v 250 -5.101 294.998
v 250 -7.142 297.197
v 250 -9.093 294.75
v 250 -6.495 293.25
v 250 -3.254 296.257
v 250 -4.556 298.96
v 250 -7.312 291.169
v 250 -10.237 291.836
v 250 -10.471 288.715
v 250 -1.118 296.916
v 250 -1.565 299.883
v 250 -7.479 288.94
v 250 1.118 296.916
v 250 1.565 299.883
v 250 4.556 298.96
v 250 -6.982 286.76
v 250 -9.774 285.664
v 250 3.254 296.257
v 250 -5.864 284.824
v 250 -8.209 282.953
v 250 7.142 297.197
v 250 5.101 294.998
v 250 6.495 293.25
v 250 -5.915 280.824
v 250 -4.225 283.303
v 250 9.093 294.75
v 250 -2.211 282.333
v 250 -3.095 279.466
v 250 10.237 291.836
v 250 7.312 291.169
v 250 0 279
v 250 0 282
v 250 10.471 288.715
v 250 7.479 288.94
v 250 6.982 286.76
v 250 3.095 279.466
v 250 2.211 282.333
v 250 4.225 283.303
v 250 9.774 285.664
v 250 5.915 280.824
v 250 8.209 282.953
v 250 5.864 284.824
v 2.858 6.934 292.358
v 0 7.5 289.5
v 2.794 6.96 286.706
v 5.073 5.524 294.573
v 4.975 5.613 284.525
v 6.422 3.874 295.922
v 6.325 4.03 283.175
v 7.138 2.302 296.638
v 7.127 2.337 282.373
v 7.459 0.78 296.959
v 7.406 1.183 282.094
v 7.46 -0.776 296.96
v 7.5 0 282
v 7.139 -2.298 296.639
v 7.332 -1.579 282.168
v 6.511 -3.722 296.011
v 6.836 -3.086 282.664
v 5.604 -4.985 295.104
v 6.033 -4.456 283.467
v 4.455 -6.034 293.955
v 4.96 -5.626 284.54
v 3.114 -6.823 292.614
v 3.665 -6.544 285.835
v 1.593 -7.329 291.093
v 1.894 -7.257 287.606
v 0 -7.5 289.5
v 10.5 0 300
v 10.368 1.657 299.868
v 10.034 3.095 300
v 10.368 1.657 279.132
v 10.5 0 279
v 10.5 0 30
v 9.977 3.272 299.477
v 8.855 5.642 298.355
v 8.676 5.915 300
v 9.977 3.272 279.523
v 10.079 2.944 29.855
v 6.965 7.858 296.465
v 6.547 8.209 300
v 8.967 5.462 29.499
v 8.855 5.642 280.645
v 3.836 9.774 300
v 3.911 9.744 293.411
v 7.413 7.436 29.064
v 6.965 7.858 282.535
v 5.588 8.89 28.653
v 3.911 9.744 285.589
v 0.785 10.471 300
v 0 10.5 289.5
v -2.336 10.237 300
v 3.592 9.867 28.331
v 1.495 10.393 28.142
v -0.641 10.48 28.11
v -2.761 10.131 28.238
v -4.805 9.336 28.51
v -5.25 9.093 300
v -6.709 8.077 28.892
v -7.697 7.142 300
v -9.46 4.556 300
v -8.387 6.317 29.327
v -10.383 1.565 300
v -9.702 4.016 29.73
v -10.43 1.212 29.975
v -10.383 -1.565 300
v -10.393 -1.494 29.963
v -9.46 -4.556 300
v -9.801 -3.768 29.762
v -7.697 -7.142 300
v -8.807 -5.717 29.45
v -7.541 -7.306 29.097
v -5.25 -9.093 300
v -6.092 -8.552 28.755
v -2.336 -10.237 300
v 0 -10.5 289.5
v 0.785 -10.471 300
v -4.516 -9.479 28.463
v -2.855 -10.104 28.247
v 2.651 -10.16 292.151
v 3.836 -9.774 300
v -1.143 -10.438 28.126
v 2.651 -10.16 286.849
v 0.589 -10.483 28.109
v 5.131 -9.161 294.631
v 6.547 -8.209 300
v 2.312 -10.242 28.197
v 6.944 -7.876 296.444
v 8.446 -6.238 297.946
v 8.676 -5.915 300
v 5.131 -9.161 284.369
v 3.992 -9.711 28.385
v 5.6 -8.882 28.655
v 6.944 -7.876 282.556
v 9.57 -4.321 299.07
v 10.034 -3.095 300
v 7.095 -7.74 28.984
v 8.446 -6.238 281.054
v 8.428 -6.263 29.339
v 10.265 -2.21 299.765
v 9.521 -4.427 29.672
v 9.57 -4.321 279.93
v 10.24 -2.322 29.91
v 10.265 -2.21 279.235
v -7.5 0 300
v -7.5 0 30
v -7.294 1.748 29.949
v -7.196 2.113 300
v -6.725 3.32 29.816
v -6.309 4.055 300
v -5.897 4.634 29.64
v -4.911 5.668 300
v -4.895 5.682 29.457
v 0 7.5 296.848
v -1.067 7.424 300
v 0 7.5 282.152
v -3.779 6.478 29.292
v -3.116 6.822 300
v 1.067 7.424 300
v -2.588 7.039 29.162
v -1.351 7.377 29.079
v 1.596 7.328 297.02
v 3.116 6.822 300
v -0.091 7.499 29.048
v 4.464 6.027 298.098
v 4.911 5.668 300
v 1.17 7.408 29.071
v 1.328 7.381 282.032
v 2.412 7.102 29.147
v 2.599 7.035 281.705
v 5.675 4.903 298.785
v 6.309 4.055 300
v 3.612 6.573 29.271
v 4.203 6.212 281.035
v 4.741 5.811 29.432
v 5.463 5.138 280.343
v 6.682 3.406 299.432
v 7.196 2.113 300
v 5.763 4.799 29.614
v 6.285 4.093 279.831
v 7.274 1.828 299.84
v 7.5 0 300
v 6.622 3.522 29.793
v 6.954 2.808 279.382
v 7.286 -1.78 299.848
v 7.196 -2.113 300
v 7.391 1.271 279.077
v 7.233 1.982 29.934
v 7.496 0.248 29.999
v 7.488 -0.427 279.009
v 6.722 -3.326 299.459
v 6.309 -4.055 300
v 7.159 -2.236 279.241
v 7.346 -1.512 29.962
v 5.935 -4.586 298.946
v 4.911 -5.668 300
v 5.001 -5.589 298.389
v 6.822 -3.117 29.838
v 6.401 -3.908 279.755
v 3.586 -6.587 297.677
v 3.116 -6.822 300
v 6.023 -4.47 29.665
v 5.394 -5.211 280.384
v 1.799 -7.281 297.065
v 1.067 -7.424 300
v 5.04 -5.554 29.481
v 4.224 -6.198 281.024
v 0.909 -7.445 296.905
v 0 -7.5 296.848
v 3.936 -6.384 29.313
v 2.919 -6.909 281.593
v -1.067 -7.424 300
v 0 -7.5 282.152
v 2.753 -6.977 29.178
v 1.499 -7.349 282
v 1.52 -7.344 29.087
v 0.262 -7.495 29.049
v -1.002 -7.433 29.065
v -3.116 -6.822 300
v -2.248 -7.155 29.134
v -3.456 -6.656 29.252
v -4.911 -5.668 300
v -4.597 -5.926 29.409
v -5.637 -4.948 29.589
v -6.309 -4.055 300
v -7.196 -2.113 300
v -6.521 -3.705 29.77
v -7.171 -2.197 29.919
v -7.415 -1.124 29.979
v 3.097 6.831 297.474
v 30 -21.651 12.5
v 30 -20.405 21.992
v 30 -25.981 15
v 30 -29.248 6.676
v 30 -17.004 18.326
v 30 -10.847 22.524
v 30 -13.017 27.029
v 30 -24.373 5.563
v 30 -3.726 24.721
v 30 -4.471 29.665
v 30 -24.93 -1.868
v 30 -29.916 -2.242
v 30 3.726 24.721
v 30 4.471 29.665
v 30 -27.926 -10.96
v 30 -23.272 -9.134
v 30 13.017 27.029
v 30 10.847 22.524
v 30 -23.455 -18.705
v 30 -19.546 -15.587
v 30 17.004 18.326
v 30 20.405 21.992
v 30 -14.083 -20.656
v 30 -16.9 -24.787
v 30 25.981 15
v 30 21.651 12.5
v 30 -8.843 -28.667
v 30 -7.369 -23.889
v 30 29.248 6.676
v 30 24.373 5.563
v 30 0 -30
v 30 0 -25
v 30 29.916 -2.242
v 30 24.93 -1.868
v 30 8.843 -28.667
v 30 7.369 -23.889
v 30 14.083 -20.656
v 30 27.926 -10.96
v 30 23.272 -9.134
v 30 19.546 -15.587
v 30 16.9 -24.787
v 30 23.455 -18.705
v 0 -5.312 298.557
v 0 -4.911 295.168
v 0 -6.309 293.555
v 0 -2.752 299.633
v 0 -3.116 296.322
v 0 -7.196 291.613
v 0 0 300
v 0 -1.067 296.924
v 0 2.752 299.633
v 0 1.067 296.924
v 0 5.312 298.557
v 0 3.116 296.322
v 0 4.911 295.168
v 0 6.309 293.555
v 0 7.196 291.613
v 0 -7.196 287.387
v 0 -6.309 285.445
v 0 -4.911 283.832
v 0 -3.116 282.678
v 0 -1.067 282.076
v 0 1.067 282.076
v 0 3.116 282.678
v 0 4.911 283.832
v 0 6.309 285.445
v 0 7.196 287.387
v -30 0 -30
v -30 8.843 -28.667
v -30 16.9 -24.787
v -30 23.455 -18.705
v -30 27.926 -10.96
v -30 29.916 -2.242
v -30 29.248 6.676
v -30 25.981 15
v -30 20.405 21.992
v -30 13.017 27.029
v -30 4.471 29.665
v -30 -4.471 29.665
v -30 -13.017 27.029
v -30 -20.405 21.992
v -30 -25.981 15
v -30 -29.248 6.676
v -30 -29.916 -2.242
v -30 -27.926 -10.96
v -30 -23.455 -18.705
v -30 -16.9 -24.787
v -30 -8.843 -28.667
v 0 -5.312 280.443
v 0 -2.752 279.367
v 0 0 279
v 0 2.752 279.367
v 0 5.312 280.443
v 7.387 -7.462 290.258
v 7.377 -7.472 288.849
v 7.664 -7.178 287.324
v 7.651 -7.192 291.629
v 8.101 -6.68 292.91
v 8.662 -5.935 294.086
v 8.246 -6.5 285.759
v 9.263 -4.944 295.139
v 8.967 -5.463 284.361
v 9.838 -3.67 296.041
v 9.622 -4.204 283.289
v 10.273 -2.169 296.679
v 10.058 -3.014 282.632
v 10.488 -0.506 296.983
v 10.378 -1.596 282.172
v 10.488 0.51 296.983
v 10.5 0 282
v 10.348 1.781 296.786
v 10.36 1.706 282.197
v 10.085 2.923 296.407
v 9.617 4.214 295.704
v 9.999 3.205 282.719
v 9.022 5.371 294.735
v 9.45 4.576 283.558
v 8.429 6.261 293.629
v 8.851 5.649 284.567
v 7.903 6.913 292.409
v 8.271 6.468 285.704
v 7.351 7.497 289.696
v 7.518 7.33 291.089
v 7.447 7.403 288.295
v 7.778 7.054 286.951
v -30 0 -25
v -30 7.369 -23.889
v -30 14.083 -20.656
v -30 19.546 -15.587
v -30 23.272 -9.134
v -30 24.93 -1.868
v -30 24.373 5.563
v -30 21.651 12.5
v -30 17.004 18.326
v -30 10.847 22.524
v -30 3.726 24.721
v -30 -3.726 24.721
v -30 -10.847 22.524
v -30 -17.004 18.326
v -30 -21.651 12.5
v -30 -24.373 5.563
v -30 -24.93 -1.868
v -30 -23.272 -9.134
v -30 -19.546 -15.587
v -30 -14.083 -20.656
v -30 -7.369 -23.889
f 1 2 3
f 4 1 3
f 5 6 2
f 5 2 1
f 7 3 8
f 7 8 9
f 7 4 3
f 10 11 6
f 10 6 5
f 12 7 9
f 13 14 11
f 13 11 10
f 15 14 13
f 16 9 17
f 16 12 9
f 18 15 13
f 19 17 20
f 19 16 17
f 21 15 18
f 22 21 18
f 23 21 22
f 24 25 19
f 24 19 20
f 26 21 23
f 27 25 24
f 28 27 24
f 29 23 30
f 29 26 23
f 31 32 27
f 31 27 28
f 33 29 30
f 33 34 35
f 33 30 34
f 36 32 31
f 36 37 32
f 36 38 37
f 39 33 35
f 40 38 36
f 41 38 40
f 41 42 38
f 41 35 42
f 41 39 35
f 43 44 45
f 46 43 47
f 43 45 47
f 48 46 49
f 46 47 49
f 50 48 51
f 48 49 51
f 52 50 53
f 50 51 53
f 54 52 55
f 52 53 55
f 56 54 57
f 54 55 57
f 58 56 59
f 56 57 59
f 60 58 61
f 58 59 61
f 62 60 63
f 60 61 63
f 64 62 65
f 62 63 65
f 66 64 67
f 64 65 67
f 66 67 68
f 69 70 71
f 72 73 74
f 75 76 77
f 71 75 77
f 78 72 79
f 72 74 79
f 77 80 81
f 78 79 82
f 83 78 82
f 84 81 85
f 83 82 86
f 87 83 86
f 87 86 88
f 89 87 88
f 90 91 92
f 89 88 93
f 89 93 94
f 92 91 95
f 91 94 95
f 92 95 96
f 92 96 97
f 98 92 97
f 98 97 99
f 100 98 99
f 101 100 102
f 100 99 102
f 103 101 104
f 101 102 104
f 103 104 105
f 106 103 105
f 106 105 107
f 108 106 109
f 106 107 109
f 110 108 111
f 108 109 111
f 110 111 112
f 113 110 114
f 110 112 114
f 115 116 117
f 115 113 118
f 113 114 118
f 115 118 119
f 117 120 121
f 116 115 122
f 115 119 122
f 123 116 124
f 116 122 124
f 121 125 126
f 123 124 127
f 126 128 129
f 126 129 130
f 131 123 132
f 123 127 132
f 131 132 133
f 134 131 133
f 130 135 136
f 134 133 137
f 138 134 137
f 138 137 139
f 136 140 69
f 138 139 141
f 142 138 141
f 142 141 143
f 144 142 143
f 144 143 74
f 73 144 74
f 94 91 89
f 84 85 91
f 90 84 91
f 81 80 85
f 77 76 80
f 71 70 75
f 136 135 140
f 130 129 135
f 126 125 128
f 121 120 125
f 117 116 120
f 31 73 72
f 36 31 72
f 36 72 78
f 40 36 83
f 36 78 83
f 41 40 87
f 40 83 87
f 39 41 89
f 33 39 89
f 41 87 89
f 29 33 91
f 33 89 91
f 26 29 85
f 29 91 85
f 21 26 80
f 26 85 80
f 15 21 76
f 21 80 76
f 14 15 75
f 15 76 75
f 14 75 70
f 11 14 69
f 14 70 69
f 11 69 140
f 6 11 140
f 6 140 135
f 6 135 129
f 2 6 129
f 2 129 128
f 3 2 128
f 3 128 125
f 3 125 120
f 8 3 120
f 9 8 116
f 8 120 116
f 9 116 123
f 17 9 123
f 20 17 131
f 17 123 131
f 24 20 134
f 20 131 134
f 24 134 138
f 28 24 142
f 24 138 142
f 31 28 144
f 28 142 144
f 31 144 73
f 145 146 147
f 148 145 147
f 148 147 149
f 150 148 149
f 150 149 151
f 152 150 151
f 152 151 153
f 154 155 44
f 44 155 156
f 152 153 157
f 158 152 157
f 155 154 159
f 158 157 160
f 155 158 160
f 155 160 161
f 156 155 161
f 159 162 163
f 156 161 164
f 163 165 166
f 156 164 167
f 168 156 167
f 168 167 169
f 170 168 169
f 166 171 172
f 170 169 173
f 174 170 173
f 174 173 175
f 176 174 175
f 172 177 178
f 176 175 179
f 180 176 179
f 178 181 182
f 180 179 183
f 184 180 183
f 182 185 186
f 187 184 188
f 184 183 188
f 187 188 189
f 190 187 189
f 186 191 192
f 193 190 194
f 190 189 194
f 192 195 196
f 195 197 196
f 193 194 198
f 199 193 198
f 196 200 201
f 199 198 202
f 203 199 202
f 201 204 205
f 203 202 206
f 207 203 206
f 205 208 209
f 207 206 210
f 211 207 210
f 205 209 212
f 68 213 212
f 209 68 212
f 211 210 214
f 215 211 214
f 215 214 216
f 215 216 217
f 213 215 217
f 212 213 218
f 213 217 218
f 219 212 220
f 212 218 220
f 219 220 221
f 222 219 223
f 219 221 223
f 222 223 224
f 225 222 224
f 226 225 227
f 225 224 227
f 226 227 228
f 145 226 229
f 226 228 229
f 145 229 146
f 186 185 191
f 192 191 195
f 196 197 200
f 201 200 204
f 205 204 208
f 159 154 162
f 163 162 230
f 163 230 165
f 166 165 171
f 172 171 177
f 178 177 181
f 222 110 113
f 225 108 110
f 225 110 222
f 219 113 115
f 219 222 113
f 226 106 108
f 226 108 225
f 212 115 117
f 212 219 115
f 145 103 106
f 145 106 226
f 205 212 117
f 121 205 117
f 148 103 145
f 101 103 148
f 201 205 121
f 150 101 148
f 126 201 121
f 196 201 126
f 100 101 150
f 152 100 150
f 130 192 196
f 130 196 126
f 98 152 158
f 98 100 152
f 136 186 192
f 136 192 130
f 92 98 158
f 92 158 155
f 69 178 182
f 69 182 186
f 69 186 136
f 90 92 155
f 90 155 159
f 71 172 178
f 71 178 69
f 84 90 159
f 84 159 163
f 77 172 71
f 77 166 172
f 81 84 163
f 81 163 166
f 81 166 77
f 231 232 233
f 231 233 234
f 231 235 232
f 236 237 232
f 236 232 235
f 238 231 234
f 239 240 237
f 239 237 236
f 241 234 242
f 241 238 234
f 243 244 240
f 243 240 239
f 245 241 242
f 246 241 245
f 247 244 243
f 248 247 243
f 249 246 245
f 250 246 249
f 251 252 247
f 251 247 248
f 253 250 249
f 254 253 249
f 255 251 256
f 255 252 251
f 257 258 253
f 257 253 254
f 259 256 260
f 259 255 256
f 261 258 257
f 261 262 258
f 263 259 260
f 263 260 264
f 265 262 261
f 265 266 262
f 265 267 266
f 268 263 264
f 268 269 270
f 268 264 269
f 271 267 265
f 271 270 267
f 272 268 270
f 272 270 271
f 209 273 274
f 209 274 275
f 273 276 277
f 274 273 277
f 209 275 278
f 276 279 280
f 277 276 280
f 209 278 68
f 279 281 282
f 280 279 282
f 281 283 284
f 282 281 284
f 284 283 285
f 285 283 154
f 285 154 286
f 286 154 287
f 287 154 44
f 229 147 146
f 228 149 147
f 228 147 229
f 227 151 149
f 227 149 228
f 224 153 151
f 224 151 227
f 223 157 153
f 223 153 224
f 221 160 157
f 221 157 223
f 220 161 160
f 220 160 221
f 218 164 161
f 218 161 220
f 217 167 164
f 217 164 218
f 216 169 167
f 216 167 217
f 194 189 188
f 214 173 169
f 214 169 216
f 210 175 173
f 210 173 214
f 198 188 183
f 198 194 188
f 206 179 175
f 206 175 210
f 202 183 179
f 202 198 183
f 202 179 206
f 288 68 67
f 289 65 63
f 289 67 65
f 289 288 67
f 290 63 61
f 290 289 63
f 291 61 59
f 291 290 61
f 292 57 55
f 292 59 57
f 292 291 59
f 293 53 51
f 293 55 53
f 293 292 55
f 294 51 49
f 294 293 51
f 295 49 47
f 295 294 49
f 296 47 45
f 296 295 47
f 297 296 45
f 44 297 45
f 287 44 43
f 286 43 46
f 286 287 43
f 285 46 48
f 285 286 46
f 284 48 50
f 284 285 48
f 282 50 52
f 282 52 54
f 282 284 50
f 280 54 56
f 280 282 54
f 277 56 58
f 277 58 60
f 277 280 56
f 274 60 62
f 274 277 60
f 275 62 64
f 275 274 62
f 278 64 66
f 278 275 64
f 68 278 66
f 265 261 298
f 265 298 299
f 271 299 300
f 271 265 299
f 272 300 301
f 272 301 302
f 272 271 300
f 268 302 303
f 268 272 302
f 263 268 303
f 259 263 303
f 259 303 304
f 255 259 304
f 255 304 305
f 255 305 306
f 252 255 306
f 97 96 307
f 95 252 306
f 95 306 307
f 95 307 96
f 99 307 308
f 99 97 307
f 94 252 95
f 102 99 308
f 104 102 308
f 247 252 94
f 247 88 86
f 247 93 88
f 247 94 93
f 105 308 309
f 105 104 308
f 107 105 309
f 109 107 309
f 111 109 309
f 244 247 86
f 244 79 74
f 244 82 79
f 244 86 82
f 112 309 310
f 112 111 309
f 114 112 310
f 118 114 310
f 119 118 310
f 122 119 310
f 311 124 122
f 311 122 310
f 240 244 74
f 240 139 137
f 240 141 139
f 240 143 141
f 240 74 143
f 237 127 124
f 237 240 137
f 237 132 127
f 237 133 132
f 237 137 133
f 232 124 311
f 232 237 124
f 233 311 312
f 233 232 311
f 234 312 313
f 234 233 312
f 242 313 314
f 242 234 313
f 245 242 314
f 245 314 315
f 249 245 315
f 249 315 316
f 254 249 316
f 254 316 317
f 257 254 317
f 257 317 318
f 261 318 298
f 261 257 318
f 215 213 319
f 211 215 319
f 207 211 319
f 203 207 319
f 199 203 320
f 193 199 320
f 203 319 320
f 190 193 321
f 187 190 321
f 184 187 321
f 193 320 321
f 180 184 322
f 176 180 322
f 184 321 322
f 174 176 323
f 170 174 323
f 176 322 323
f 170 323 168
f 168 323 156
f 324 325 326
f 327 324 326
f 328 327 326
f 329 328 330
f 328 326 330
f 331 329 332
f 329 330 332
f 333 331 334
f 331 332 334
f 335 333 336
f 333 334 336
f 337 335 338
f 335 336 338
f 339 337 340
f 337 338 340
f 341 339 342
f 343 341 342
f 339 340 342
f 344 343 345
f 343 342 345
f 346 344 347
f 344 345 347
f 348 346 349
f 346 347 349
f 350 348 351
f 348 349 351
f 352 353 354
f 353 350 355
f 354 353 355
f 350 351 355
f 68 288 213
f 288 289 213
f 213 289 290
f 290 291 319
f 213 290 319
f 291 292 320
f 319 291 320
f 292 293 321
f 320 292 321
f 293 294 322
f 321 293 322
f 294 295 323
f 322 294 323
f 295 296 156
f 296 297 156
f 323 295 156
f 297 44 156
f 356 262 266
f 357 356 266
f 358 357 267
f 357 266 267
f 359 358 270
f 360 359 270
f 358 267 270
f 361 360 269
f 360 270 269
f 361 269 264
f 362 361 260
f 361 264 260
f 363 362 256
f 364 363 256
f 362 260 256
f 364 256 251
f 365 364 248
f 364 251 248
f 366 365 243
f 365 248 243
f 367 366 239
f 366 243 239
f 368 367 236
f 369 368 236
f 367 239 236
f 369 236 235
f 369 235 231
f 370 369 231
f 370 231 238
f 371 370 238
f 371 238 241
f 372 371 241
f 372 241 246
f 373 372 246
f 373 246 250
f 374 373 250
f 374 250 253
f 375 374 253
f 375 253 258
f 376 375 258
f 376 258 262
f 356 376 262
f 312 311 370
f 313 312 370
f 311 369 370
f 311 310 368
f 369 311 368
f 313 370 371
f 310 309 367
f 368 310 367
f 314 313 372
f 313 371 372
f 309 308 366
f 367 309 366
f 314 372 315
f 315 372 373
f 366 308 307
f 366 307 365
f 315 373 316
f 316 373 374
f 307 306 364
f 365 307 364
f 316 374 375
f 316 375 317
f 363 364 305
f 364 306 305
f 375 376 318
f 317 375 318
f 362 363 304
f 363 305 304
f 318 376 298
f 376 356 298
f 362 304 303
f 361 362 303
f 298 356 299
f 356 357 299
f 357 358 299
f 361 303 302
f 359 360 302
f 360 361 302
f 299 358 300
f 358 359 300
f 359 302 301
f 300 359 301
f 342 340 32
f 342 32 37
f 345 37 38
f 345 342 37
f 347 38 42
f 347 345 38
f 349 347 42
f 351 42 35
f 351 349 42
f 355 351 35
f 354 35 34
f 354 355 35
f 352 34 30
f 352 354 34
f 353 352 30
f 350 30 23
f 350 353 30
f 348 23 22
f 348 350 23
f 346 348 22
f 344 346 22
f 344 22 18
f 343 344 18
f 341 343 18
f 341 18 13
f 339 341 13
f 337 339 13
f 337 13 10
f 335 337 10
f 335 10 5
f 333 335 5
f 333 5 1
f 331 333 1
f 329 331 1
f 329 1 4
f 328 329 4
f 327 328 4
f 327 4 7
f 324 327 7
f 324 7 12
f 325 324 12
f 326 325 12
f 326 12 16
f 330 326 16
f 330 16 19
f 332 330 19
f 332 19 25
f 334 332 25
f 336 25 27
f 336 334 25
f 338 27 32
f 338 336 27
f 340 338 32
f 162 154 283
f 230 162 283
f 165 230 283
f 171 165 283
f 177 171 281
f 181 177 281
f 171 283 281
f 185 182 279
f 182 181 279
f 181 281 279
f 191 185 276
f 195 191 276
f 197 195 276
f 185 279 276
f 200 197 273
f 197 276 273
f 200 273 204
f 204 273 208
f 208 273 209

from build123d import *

# Parameters (mm, degrees)
SKETCH_1_R          = 10.5
EXTRUDE_1_DEPTH     = 300
SKETCH_2_R          = 7.5
CUT_EXTRUDE_1_DEPTH = 301
SKETCH_4_R          = 30
EXTRUDE_2_DEPTH     = 30
SKETCH_5_R          = 25
CUT_EXTRUDE_2_DEPTH = 61.0000001
SKETCH_7_R          = 10.5
SKETCH_7_R_2        = 7.5
EXTRUDE_4_DEPTH     = 250


with BuildPart() as part:
    # Эскиз1 → Бобышка-Вытянуть1 (new body)
    with BuildSketch(Plane.XY):
        Circle(SKETCH_1_R)
    extrude(amount=EXTRUDE_1_DEPTH)

    # Эскиз2 → Вырез-Вытянуть1 (cut, through all)
    with BuildSketch(Plane(origin=(0, 0, 0), x_dir=(-1, 0, 0), z_dir=(0, 0, -1))):
        Circle(SKETCH_2_R)
    extrude(amount=-CUT_EXTRUDE_1_DEPTH, mode=Mode.SUBTRACT)

    # Эскиз4 → Бобышка-Вытянуть2 (add, symmetric)
    with BuildSketch(Plane(origin=(0, 0, 0), x_dir=(0, 0, -1), z_dir=(1, 0, 0))):
        Circle(SKETCH_4_R)
    extrude(amount=EXTRUDE_2_DEPTH, both=True)

    # Эскиз5 → Вырез-Вытянуть2 (cut, through all)
    with BuildSketch(Plane(origin=(30, 0, 0), x_dir=(0, 0, -1), z_dir=(1, 0, 0))):
        Circle(SKETCH_5_R)
    extrude(amount=-CUT_EXTRUDE_2_DEPTH, mode=Mode.SUBTRACT)

    # Эскиз7 → Бобышка-Вытянуть4 (add)
    with BuildSketch(Plane(origin=(0, 0, 0), x_dir=(0, 0, -1), z_dir=(1, 0, 0))):
        with Locations((-289.5, 0)):
            Circle(SKETCH_7_R)
        with Locations((-289.5, 0)):
            Circle(SKETCH_7_R_2, mode=Mode.SUBTRACT)
    extrude(amount=EXTRUDE_4_DEPTH)


solid = part.part
